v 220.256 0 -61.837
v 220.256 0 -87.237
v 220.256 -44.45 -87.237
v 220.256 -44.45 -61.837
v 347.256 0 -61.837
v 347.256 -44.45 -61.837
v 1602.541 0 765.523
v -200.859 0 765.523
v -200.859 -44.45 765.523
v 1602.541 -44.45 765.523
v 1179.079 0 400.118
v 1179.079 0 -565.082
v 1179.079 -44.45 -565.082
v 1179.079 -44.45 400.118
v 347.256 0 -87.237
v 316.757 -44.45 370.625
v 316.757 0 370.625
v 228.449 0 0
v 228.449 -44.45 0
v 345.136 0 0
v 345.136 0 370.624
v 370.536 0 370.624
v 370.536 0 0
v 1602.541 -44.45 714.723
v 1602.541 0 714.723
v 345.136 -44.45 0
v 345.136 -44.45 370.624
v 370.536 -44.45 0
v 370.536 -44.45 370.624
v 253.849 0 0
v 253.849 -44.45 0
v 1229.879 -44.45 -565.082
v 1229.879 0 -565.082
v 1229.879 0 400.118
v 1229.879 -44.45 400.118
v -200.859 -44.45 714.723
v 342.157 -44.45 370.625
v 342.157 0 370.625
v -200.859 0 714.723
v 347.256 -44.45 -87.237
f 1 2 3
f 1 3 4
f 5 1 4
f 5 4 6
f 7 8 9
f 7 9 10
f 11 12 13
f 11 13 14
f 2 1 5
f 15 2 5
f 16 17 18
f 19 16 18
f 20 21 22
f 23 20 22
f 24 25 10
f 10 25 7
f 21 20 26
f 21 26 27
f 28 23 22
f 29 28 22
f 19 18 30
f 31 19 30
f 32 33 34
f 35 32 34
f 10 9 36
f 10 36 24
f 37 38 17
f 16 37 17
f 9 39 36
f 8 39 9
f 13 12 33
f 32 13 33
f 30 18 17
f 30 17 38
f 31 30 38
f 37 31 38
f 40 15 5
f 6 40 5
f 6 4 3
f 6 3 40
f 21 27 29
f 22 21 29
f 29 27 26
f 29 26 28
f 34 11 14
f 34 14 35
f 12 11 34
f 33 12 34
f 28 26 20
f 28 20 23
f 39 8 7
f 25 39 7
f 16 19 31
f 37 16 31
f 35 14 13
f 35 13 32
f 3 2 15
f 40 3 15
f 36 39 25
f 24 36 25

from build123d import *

# Parameters (mm, degrees)
F1_DEPTH = 44.45
F0_W     = 127
F0_H     = 25.4
F0_W_2   = 50.8
F0_H_2   = 965.2
F0_W_3   = 1803.4
F0_H_3   = 50.8
F0_W_4   = 25.4
F0_H_4   = 370.6241


# Not quite as in the source:
# - a feature names something its author has since deleted; it is built from what else it names


with BuildPart() as f1:
    # F0 (on Front) → F1 (new body)
    with BuildSketch(Plane.XZ):
        Polygon((316.756593769, 370.624931355), (228.4494012073, 0), (253.8494012073, 0), (342.156593769, 370.624931355), align=None)
    extrude(amount=F1_DEPTH)


with BuildPart() as f1b:
    # F0 (on Front) → F1, piece 2 (new body)
    with BuildSketch(Plane.XZ):
        with Locations((283.7561050653, -74.5373453617)):
            Rectangle(F0_W, F0_H)
    extrude(amount=F1_DEPTH)


with BuildPart() as f1c:
    # F0 (on Front) → F1, piece 3 (new body)
    with BuildSketch(Plane.XZ):
        with Locations((1204.4791366577, -82.4821556568)):
            Rectangle(F0_W_2, F0_H_2)
    extrude(amount=F1_DEPTH)


with BuildPart() as f1d:
    # F0 (on Front) → F1, piece 4 (new body)
    with BuildSketch(Plane.XZ):
        with Locations((700.8411536932, 740.1225183487)):
            Rectangle(F0_W_3, F0_H_3)
    extrude(amount=F1_DEPTH)


with BuildPart() as f1e:
    # F0 (on Front) → F1, piece 5 (new body)
    with BuildSketch(Plane.XZ):
        with Locations((357.8362252235, 185.31205)):
            Rectangle(F0_W_4, F0_H_4)
    extrude(amount=F1_DEPTH)


solid = Compound([f1.part, f1b.part, f1c.part, f1d.part, f1e.part])
